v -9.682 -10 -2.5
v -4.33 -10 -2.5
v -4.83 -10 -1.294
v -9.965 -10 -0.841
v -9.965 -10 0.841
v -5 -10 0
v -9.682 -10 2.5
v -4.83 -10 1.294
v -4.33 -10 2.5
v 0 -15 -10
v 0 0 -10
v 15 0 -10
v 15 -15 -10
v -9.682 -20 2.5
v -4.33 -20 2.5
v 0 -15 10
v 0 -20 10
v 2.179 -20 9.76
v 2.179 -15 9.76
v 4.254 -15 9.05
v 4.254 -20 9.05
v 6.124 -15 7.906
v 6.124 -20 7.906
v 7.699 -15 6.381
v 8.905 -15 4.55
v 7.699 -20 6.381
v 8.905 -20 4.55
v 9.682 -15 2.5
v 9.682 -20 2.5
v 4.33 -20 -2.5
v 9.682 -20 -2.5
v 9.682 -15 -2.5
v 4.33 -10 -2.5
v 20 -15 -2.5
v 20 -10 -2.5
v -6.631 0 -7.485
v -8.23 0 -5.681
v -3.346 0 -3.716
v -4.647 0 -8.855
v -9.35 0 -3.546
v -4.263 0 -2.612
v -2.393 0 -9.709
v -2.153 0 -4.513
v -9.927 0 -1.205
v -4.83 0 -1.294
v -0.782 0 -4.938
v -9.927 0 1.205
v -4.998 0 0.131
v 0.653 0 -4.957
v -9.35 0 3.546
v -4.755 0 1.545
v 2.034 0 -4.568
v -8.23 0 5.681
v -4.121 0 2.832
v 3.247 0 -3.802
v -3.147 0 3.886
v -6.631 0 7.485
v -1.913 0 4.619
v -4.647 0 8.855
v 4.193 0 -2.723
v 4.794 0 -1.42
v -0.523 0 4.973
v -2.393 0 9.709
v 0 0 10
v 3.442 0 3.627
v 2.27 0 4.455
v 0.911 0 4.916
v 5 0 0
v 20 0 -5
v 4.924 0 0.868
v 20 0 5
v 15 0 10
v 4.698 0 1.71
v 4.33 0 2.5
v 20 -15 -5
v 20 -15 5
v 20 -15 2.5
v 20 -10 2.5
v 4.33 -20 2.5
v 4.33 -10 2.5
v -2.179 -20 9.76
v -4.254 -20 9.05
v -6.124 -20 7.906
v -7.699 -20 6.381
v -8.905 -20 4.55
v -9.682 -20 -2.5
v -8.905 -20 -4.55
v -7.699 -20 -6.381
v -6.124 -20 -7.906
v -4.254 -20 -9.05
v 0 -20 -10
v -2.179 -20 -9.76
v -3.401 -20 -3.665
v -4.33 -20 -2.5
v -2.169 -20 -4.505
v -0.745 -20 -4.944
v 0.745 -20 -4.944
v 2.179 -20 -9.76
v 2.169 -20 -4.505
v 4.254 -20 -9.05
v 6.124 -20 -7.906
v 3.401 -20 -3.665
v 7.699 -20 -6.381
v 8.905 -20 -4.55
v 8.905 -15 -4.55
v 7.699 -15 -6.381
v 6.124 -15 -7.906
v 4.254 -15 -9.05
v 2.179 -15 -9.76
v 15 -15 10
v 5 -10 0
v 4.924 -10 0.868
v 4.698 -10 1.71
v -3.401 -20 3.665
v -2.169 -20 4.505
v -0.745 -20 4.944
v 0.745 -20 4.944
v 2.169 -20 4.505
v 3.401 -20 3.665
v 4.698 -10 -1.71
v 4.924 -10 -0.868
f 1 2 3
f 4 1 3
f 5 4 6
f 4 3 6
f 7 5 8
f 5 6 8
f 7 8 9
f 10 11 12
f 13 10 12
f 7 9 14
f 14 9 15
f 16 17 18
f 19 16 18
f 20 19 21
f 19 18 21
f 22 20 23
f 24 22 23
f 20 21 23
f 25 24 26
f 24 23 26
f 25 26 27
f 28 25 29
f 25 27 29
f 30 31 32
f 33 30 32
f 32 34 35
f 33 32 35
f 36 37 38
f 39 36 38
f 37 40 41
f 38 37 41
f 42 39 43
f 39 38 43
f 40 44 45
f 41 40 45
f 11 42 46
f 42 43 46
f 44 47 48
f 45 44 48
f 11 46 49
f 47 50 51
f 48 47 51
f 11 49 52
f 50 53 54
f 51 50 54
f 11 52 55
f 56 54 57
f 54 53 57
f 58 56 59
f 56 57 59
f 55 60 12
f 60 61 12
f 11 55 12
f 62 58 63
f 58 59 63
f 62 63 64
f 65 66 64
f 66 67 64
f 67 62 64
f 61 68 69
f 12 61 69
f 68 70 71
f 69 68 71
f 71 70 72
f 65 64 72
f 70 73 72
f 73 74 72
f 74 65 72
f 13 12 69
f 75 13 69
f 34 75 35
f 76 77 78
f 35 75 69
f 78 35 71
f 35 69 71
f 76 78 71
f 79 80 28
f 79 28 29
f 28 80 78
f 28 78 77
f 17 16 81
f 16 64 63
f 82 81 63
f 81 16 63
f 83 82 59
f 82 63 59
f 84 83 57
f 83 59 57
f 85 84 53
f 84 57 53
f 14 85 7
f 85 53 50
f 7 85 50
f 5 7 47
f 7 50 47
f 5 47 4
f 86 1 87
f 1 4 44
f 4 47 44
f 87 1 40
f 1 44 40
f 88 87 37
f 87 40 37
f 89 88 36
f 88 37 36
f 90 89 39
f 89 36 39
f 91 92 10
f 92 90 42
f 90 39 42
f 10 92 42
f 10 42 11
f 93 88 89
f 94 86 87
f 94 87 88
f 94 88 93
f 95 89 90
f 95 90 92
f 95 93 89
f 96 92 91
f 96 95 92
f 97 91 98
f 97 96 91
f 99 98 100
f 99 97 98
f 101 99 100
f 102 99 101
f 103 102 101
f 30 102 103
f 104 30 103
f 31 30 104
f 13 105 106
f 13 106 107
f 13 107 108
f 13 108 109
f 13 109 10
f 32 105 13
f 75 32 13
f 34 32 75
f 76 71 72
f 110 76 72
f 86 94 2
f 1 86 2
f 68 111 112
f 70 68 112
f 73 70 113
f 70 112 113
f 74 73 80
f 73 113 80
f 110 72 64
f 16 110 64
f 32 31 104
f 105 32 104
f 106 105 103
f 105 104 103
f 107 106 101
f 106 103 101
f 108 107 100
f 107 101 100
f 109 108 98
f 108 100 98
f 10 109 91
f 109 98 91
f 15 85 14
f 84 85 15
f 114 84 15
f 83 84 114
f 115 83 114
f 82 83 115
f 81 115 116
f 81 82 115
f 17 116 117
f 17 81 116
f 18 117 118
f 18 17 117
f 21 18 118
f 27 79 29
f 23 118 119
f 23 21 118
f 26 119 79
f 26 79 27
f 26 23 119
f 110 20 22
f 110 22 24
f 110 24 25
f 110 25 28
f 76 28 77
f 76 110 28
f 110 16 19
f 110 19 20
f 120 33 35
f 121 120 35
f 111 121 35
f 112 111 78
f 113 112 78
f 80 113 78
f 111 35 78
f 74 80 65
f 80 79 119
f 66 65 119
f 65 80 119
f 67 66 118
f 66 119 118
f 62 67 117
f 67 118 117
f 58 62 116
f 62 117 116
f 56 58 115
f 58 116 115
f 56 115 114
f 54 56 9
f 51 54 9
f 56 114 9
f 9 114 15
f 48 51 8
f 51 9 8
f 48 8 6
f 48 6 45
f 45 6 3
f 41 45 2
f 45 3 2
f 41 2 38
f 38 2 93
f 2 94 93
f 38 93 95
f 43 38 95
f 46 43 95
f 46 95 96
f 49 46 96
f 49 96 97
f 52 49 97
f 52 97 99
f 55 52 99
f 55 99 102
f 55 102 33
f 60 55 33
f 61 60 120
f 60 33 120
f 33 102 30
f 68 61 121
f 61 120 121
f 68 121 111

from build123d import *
from build123d import SkipClean  # not in build123d's __all__

# Parameters (mm, degrees)
F1_DEPTH = 20
F3_DEPTH = 50
F5_DEPTH = 5
F7_DEPTH = 25


# Not quite as in the source:
# - after a boolean that leaves OpenCascade's solid faulty, fix() repairs it


with BuildPart() as f1:
    # F0 (on Front) → F1 (new body)
    with BuildSketch(Plane.XZ):
        with BuildLine():
            ThreePointArc((0, -10), (7.0710678119, -7.0710678119), (10, 0))
            ThreePointArc((10, 0), (7.0710678119, 7.0710678119), (0, 10))
            ThreePointArc((0, 10), (-10, 0), (0, -10))
        make_face()
        with BuildLine():
            ThreePointArc((0, 10), (7.0710678119, 7.0710678119), (10, 0))
            ThreePointArc((10, 0), (7.0710678119, -7.0710678119), (0, -10))
            Line((0, -10), (15, -10))
            Line((15, -10), (20, -5))
            Line((20, -5), (20, 5))
            Line((20, 5), (15, 10))
            Line((15, 10), (0, 10))
        make_face()
    extrude(amount=F1_DEPTH)

    # F2 (on face) → F3 (cut)
    with BuildSketch(Plane.YZ.offset(20)):
        Polygon((-20, 2.5), (-20, 0), (-20, -2.5), (-10, -2.5), (-10, 2.5), align=None)
    extrude(amount=-F3_DEPTH, mode=Mode.SUBTRACT)

    # F4 (on face) → F5 (cut)
    with BuildSketch(Plane.XZ.offset(20)):
        with BuildLine():
            ThreePointArc((9.6824583655, -2.5), (6.123724357, -7.9056941504), (0, -10))
            Line((0, -10), (15, -10))
            Line((15, -10), (20, -5))
            Line((20, -5), (20, -2.5))
            Line((20, -2.5), (9.6824583655, -2.5))
        make_face()
        with BuildLine():
            Line((15, 10), (0, 10))
            ThreePointArc((0, 10), (6.123724357, 7.9056941504), (9.6824583655, 2.5))
            Line((9.6824583655, 2.5), (20, 2.5))
            Line((20, 2.5), (20, 5))
            Line((20, 5), (15, 10))
        make_face()
    with SkipClean():  # cleaning this boolean's faces spoils the solid; the shape is the same uncleaned
        extrude(amount=-F5_DEPTH, mode=Mode.SUBTRACT)

    # F6 (on face) → F7 (cut)
    with BuildSketch(Plane.XZ.offset(20)):
        with BuildLine():
            ThreePointArc((-4.3301270189, 2.5), (-1.2940952255, -4.8296291314), (5, 0))
            ThreePointArc((5, 0), (4.8296291314, 1.2940952255), (4.3301270189, 2.5))
            Line((4.3301270189, 2.5), (-4.3301270189, 2.5))
        make_face()
        with BuildLine():
            Line((-4.3301270189, 2.5), (4.3301270189, 2.5))
            ThreePointArc((4.3301270189, 2.5), (0, 5), (-4.3301270189, 2.5))
        make_face()
    extrude(amount=-F7_DEPTH, mode=Mode.SUBTRACT)

    add(f1.part.fix(), mode=Mode.REPLACE)


solid = f1.part
